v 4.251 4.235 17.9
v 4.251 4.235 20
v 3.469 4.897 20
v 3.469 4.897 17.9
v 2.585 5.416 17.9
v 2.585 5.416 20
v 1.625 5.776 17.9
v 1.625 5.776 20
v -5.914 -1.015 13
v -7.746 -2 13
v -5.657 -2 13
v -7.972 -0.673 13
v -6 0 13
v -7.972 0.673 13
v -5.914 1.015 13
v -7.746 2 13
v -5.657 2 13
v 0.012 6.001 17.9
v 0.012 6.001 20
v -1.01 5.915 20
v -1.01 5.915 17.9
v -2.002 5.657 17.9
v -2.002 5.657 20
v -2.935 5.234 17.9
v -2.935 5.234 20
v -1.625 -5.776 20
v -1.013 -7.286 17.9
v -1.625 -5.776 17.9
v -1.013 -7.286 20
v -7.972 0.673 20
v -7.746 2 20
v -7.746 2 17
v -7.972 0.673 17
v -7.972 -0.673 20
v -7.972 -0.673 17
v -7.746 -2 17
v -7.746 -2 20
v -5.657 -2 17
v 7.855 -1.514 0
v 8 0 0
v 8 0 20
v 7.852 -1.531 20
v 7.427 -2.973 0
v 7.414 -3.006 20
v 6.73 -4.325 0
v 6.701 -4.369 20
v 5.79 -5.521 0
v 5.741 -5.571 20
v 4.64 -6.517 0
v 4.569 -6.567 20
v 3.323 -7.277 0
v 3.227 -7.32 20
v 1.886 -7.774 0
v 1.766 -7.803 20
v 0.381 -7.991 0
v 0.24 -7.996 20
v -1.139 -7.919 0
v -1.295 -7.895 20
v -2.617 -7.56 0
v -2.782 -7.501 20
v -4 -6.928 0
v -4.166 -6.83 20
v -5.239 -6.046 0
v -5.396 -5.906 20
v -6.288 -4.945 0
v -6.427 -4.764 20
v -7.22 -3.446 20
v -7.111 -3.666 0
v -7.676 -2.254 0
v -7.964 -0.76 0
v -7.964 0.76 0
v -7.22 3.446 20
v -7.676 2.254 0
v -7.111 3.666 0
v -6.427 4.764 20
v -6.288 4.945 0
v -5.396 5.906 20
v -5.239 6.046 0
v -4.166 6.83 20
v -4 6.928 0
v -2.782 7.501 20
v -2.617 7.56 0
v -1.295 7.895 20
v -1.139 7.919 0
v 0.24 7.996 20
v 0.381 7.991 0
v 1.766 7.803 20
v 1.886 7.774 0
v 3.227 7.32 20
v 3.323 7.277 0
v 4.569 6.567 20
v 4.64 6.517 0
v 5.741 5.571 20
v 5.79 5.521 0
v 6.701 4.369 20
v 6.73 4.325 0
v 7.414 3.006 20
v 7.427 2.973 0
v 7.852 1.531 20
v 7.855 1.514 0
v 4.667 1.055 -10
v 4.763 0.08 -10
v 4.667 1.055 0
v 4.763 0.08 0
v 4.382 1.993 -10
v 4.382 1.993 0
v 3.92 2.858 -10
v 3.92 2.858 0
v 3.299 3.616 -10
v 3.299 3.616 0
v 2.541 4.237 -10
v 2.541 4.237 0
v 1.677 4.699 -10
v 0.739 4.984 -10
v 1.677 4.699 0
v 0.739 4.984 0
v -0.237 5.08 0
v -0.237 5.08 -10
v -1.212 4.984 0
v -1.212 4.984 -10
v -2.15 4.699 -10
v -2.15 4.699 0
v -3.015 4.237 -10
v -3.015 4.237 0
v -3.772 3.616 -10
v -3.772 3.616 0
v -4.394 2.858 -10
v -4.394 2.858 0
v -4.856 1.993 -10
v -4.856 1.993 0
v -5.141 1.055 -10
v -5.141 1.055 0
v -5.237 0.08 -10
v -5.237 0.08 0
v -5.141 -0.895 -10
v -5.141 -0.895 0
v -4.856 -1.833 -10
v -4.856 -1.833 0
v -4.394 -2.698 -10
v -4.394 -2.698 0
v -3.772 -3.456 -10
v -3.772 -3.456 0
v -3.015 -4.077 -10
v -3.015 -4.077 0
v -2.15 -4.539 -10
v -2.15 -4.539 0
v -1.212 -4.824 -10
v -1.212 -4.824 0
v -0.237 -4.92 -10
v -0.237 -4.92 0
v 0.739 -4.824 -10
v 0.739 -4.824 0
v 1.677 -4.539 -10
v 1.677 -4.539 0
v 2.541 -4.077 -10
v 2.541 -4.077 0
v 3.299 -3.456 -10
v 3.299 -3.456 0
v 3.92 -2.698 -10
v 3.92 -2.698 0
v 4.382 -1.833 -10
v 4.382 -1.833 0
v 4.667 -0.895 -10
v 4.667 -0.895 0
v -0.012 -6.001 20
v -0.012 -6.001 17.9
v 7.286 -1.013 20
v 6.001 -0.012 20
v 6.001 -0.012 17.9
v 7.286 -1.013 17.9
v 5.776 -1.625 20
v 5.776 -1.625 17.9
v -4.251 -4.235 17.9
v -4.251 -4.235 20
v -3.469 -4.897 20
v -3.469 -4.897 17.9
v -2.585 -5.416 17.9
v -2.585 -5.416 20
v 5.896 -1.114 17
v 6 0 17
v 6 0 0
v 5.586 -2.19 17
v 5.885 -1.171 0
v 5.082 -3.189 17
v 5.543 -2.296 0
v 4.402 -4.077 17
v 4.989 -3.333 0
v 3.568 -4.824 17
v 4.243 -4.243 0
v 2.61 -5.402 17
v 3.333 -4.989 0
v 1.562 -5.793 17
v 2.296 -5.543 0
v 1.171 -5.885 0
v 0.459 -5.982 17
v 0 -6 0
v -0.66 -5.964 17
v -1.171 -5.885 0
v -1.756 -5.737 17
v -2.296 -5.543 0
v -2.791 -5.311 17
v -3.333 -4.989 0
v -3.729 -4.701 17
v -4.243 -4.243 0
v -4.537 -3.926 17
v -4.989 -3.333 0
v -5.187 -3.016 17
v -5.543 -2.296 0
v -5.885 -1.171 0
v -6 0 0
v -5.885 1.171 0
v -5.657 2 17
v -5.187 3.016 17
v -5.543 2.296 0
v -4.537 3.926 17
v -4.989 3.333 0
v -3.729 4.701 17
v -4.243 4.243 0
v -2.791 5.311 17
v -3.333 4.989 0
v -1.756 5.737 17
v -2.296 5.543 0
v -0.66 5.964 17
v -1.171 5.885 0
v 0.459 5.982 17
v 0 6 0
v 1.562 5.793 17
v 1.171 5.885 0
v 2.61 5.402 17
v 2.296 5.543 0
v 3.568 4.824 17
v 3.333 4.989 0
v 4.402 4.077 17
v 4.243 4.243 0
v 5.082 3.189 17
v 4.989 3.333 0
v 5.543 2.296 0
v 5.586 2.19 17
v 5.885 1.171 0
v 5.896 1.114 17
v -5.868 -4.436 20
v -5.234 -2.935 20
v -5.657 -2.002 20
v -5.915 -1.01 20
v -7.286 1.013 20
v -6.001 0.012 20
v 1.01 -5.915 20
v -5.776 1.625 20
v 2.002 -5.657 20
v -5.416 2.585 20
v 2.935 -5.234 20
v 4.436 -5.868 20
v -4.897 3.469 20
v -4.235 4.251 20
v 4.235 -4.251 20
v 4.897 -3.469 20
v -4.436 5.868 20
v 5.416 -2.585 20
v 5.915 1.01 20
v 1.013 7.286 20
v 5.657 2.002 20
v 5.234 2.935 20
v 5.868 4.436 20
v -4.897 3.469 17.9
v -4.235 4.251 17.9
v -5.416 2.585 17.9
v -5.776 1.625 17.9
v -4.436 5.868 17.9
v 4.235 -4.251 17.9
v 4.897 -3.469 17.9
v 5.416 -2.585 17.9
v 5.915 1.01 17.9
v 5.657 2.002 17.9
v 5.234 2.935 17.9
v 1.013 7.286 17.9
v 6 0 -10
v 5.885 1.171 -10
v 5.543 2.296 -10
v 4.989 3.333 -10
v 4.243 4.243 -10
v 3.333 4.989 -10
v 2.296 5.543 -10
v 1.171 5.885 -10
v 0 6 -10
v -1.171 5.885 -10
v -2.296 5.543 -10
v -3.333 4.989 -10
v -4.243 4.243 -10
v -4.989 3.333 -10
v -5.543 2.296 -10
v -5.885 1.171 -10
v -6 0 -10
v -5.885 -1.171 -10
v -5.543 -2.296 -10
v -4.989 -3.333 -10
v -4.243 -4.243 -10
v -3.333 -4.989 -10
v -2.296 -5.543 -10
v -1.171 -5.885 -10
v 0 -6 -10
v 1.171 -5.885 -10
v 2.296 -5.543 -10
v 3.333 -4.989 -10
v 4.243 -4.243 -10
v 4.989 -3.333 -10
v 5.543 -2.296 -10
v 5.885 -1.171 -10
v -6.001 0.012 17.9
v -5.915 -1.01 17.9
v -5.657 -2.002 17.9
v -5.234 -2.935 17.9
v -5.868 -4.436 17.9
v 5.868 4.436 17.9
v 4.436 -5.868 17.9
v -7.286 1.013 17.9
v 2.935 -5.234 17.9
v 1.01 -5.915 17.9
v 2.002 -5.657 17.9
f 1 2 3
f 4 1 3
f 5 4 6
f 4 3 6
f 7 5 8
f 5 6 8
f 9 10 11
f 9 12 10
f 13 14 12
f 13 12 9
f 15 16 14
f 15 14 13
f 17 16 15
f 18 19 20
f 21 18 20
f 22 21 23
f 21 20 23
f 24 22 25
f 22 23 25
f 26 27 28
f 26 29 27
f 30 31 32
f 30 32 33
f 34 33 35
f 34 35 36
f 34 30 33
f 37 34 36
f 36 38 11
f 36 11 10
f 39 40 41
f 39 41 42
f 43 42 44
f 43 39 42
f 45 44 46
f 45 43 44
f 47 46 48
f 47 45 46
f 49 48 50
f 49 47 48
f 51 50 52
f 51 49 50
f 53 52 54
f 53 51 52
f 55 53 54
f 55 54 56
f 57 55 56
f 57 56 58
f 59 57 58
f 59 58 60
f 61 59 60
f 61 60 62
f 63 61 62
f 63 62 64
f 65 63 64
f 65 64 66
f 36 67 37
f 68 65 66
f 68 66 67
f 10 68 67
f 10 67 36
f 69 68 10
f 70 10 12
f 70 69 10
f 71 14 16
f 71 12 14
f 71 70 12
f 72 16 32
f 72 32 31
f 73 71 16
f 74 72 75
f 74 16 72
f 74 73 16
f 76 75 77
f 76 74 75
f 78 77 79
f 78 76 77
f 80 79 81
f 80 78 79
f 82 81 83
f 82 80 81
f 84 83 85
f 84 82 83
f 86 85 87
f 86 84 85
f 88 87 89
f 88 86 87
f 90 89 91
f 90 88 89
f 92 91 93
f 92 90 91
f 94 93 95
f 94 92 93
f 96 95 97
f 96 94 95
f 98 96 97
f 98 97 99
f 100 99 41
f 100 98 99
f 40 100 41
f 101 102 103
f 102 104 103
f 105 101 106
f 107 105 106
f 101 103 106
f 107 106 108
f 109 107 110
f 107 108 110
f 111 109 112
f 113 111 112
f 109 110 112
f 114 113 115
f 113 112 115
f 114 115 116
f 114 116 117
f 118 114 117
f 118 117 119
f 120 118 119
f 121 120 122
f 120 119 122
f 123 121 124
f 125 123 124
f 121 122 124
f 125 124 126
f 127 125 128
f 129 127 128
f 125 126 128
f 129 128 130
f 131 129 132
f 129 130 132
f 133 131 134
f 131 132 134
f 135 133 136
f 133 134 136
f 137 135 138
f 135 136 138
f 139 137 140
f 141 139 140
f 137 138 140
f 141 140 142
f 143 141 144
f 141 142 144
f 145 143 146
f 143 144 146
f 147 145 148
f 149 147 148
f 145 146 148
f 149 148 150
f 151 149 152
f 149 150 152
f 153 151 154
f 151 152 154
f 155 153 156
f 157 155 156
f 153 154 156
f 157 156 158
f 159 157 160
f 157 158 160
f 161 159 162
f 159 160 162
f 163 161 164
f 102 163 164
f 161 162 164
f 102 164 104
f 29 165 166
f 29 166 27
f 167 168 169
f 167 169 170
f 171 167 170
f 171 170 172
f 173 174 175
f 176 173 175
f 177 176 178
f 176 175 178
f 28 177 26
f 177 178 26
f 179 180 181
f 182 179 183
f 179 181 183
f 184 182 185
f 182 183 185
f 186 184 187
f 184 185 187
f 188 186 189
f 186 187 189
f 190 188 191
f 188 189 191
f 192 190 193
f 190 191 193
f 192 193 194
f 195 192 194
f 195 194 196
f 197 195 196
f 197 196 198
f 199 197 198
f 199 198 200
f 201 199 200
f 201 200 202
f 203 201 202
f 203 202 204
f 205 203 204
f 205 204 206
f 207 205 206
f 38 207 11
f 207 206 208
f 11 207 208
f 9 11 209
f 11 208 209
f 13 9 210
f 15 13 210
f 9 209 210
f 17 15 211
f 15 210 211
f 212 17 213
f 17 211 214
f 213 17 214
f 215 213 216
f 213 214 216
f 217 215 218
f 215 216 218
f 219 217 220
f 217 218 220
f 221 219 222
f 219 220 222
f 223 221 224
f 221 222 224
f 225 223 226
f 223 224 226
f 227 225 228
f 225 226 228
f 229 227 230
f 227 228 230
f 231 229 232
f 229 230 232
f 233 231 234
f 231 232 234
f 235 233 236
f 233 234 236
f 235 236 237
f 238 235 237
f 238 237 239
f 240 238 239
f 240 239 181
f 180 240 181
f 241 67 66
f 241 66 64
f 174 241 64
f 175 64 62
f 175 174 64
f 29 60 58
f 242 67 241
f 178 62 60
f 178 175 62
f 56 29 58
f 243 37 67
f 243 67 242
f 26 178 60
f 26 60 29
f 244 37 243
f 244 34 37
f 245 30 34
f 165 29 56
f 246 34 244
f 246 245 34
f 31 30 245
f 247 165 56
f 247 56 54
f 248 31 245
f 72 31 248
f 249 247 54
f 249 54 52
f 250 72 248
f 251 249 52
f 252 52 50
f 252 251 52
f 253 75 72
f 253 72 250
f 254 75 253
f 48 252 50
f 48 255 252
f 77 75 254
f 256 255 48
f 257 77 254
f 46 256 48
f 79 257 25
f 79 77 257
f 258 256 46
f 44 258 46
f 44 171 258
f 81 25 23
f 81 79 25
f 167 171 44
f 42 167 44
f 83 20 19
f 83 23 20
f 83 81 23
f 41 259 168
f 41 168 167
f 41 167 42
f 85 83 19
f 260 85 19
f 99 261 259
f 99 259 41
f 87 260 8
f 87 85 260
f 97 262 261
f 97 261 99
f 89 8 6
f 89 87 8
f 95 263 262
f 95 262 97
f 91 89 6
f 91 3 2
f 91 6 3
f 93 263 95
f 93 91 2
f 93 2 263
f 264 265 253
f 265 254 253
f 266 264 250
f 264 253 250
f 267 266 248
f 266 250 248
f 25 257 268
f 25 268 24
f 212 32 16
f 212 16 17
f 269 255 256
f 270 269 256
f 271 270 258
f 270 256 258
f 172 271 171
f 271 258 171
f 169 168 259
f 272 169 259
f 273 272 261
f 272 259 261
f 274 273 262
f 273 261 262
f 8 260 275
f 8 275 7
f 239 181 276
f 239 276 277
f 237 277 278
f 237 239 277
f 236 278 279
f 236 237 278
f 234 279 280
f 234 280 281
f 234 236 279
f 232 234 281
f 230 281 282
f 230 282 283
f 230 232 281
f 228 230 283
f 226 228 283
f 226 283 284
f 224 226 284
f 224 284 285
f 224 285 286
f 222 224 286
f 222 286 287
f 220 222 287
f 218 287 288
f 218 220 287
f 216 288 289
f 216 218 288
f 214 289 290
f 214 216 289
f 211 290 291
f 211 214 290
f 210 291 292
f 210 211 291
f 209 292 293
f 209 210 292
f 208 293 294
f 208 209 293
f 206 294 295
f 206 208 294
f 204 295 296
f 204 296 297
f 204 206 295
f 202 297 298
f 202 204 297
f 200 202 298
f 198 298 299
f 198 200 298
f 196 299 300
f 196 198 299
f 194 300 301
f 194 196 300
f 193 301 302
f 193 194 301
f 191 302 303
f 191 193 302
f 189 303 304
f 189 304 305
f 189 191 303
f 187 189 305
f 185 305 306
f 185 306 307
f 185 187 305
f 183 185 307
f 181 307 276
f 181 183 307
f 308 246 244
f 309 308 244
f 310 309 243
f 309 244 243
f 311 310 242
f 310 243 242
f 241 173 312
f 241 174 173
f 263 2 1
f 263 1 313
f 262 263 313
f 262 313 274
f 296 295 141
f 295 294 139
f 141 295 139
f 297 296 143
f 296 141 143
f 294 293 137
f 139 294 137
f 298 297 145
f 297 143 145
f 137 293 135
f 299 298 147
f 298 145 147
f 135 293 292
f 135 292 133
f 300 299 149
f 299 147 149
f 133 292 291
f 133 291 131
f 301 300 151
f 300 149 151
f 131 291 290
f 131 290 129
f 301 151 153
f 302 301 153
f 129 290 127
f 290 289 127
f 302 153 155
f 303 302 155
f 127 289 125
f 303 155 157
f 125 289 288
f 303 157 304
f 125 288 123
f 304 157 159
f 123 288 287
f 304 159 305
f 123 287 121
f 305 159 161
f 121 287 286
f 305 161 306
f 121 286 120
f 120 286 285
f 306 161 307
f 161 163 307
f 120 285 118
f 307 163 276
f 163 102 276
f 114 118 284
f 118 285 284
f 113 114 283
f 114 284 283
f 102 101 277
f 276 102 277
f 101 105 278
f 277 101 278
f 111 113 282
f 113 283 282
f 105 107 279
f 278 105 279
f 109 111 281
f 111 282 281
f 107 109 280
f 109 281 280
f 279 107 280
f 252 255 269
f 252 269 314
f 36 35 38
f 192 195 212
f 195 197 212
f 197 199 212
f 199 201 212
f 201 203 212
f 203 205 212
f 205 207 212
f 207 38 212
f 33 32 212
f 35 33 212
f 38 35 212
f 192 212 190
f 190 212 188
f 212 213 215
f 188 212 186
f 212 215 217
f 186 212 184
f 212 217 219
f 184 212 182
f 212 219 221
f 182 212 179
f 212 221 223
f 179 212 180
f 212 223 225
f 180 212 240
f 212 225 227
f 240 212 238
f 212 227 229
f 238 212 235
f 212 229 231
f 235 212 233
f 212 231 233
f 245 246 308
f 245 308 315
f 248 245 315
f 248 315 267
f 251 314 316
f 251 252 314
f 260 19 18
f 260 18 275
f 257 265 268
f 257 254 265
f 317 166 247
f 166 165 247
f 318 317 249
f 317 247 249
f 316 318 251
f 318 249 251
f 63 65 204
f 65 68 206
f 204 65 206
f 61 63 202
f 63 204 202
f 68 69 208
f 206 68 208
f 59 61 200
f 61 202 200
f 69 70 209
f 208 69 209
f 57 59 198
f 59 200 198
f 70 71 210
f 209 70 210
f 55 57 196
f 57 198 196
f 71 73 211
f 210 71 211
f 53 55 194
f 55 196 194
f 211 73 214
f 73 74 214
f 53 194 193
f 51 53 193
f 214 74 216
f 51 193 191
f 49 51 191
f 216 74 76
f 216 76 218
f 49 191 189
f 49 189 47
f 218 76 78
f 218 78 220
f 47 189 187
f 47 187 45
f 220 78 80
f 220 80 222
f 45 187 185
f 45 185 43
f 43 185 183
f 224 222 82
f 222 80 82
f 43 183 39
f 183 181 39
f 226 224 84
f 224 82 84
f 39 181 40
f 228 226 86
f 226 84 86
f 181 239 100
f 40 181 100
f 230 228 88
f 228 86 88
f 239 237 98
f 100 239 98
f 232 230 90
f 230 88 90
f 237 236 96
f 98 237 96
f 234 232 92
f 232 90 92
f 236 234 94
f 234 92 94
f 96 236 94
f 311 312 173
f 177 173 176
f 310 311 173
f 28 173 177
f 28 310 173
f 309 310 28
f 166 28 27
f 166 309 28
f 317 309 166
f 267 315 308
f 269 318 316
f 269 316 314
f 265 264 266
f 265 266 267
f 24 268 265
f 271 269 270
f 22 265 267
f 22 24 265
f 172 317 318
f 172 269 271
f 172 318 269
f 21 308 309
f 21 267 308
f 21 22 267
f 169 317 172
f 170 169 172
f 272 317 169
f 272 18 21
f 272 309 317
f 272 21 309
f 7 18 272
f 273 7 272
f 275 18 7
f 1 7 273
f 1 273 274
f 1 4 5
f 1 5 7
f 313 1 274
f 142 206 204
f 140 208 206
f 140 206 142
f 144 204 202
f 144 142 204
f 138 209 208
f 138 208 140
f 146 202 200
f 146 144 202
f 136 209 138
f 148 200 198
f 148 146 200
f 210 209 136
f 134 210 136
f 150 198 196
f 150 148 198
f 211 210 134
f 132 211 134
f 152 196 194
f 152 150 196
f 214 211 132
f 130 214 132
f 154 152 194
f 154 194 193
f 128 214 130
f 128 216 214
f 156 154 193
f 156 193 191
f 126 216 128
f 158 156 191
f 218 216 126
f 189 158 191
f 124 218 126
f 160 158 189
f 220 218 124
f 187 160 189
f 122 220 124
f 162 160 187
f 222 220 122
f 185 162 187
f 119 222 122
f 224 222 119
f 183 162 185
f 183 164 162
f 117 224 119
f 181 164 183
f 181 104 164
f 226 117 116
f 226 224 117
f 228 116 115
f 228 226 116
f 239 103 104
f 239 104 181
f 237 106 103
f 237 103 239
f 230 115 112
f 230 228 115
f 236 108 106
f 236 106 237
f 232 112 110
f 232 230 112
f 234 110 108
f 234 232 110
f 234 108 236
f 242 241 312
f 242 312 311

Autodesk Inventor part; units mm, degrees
ref_plane "YZ Plane" through (0, 0, 0) normal (1, 0, 0) x (0, 1, 0)
ref_plane "XZ Plane" through (0, 0, 0) normal (0, 1, 0) x (-1, 0, 0)
ref_plane "XY Plane" through (0, 0, 0) normal (0, 0, 1) x (1, 0, 0)
sketch "Sketch1" plane through (0, 0, 0) normal (0, 0, 1) x (1, 0, 0)
  circle A0 centre (0, 0) radius 6.1 projected
  circle A1 centre (0, 0) radius 8 projected
  circle A2 centre (0, 0) radius 6.1 projected
  circle A3 centre (0, 0) radius 6
  circle A4 centre (-0.2369, 0.08) radius 5 projected
  circle A5 centre (-0.2369, 0.08) radius 5 projected
  point P0 (0, 0)
  dimension "d0" = 0.1
extrude "Extrusion1" add sketch "Sketch1" against normal blind 10 contours A3
sketch "Sketch2" plane through (0, 0, 0) normal (0, 0, 1) x (1, 0, 0)
  circle A0 centre (0, 0) radius 6.1 projected
  circle A1 centre (0, 0) radius 8 projected
  circle A2 centre (0, 0) radius 6 projected
  point P0 (0, 0)
extrude "Extrusion2" add sketch "Sketch2" along normal blind 20 contours A0 | A1
sketch "Sketch3" plane through (0, 0, 20) normal (0, 0, 1) x (1, 0, 0)
  line L0 (-1.3404, -2) -> (-8, -2)
  line L1 (-8, -2) -> (-8, 2)
  line L2 (-8, 2) -> (-1.3404, 2)
  line L3 (-1.3404, 2) -> (-1.3404, -2)
  line L4 (-1.3404, -2) -> (-8, 2) construction
  line L5 (-8, -2) -> (-1.3404, 2) construction
  point P0 (0, 0)
  point P1 (-4.6702, 0)
  dimension "d5" = 4
extrude "Extrusion3" cut sketch "Sketch3" against normal blind 7
sketch "Sketch4" plane through (0, 0, 20) normal (0, 0, 1) x (1, 0, 0)
  line L0 (-5.6569, -2) -> (-7.746, -2) projected
  arc A0 (-7.746, -2) -> (-7.746, 2) centre (0, 0) ccw projected
  line L1 (-7.746, 2) -> (-5.6569, 2) projected
  arc A1 (-5.6569, -2) -> (-5.6569, 2) centre (0, 0) ccw projected
  circle A2 centre (0, 0) radius 8
  point P0 (0, 0)
  point P1 (-7.746, 2)
extrude "Extrusion4" add sketch "Sketch4" against normal blind 3
sketch "Sketch6" plane through (0, 0, 20) normal (0, 0, 1) x (1, 0, 0)
  circle A0 centre (0, 0) radius 8 projected
  arc A1 (-4.1289, 4.2146) -> (-5.6926, 1.5507) centre (0, 0) ccw projected
  line L0 (-5.6926, 1.5507) -> (-7.0866, 0.985) projected
  line L1 (-7.0866, 0.985) -> (-5.8997, 0.0606) projected
  arc A2 (-5.8997, 0.0606) -> (-5.1217, -2.9288) centre (0, 0) ccw projected
  line L2 (-5.1217, -2.9288) -> (-5.7075, -4.3145) projected
  line L3 (-5.7075, -4.3145) -> (-4.2146, -4.1289) projected
  arc A3 (-4.2146, -4.1289) -> (-1.5507, -5.6926) centre (0, 0) ccw projected
  line L4 (-1.5507, -5.6926) -> (-0.985, -7.0866) projected
  line L5 (-0.985, -7.0866) -> (-0.0606, -5.8997) projected
  arc A4 (-0.0606, -5.8997) -> (2.9288, -5.1217) centre (0, 0) ccw projected
  line L6 (2.9288, -5.1217) -> (4.3145, -5.7075) projected
  line L7 (4.3145, -5.7075) -> (4.1289, -4.2146) projected
  arc A5 (4.1289, -4.2146) -> (5.6926, -1.5507) centre (0, 0) ccw projected
  line L8 (5.6926, -1.5507) -> (7.0866, -0.985) projected
  line L9 (7.0866, -0.985) -> (5.8997, -0.0606) projected
  arc A6 (5.8997, -0.0606) -> (5.1217, 2.9288) centre (0, 0) ccw projected
  line L10 (5.1217, 2.9288) -> (5.7075, 4.3145) projected
  line L11 (5.7075, 4.3145) -> (4.2146, 4.1289) projected
  arc A7 (4.2146, 4.1289) -> (1.5507, 5.6926) centre (0, 0) ccw projected
  line L12 (1.5507, 5.6926) -> (0.985, 7.0866) projected
  line L13 (0.985, 7.0866) -> (0.0606, 5.8997) projected
  arc A8 (0.0606, 5.8997) -> (-2.9288, 5.1217) centre (0, 0) ccw projected
  line L14 (-2.9288, 5.1217) -> (-4.3145, 5.7075) projected
  line L15 (-4.3145, 5.7075) -> (-4.1289, 4.2146) projected
  arc A9 (4.2351, -4.2514) -> (5.7765, -1.6254) centre (0, 0) ccw
  line L16 (4.2351, -4.2514) -> (4.4361, -5.8684)
  line L17 (4.4361, -5.8684) -> (2.9353, -5.234)
  arc A10 (-0.0115, -6.0008) -> (2.9353, -5.234) centre (0, 0) ccw
  line L18 (-0.0115, -6.0008) -> (-1.0128, -7.2864)
  line L19 (-1.0128, -7.2864) -> (-1.6254, -5.7765)
  arc A11 (-4.2514, -4.2351) -> (-1.6254, -5.7765) centre (0, 0) ccw
  line L20 (-4.2514, -4.2351) -> (-5.8684, -4.4361)
  line L21 (-5.8684, -4.4361) -> (-5.234, -2.9353)
  arc A12 (-6.0008, 0.0115) -> (-5.234, -2.9353) centre (0, 0) ccw
  line L22 (-6.0008, 0.0115) -> (-7.2864, 1.0128)
  line L23 (-7.2864, 1.0128) -> (-5.7765, 1.6254)
  arc A13 (-4.2351, 4.2514) -> (-5.7765, 1.6254) centre (0, 0) ccw
  line L24 (-4.2351, 4.2514) -> (-4.4361, 5.8684)
  line L25 (-4.4361, 5.8684) -> (-2.9353, 5.234)
  arc A14 (0.0115, 6.0008) -> (-2.9353, 5.234) centre (0, 0) ccw
  line L26 (0.0115, 6.0008) -> (1.0128, 7.2864)
  line L27 (1.0128, 7.2864) -> (1.6254, 5.7765)
  arc A15 (4.2514, 4.2351) -> (1.6254, 5.7765) centre (0, 0) ccw
  line L28 (4.2514, 4.2351) -> (5.8684, 4.4361)
  line L29 (5.8684, 4.4361) -> (5.234, 2.9353)
  arc A16 (6.0008, -0.0115) -> (5.234, 2.9353) centre (0, 0) ccw
  line L30 (6.0008, -0.0115) -> (7.2864, -1.0128)
  line L31 (7.2864, -1.0128) -> (5.7765, -1.6254)
  point P0 (0, 0)
extrude "Extrusion5" cut sketch "Sketch6" against normal blind 2.1 contours L15 L14 A8 L13 L12 A7 L11 L10 A6 L9 L8 A5 L7 L6 A4 L5 L4 A3 L3 L2 A2 L1 L0 A1 | L16 L17 A10 L18 L19 A11 L20 L21 A12 L22 L23 A13 L24 L25 A14 L26 L27 A15 L28 L29 A16 L30 L31 A9
properties part number "handle_base3"
